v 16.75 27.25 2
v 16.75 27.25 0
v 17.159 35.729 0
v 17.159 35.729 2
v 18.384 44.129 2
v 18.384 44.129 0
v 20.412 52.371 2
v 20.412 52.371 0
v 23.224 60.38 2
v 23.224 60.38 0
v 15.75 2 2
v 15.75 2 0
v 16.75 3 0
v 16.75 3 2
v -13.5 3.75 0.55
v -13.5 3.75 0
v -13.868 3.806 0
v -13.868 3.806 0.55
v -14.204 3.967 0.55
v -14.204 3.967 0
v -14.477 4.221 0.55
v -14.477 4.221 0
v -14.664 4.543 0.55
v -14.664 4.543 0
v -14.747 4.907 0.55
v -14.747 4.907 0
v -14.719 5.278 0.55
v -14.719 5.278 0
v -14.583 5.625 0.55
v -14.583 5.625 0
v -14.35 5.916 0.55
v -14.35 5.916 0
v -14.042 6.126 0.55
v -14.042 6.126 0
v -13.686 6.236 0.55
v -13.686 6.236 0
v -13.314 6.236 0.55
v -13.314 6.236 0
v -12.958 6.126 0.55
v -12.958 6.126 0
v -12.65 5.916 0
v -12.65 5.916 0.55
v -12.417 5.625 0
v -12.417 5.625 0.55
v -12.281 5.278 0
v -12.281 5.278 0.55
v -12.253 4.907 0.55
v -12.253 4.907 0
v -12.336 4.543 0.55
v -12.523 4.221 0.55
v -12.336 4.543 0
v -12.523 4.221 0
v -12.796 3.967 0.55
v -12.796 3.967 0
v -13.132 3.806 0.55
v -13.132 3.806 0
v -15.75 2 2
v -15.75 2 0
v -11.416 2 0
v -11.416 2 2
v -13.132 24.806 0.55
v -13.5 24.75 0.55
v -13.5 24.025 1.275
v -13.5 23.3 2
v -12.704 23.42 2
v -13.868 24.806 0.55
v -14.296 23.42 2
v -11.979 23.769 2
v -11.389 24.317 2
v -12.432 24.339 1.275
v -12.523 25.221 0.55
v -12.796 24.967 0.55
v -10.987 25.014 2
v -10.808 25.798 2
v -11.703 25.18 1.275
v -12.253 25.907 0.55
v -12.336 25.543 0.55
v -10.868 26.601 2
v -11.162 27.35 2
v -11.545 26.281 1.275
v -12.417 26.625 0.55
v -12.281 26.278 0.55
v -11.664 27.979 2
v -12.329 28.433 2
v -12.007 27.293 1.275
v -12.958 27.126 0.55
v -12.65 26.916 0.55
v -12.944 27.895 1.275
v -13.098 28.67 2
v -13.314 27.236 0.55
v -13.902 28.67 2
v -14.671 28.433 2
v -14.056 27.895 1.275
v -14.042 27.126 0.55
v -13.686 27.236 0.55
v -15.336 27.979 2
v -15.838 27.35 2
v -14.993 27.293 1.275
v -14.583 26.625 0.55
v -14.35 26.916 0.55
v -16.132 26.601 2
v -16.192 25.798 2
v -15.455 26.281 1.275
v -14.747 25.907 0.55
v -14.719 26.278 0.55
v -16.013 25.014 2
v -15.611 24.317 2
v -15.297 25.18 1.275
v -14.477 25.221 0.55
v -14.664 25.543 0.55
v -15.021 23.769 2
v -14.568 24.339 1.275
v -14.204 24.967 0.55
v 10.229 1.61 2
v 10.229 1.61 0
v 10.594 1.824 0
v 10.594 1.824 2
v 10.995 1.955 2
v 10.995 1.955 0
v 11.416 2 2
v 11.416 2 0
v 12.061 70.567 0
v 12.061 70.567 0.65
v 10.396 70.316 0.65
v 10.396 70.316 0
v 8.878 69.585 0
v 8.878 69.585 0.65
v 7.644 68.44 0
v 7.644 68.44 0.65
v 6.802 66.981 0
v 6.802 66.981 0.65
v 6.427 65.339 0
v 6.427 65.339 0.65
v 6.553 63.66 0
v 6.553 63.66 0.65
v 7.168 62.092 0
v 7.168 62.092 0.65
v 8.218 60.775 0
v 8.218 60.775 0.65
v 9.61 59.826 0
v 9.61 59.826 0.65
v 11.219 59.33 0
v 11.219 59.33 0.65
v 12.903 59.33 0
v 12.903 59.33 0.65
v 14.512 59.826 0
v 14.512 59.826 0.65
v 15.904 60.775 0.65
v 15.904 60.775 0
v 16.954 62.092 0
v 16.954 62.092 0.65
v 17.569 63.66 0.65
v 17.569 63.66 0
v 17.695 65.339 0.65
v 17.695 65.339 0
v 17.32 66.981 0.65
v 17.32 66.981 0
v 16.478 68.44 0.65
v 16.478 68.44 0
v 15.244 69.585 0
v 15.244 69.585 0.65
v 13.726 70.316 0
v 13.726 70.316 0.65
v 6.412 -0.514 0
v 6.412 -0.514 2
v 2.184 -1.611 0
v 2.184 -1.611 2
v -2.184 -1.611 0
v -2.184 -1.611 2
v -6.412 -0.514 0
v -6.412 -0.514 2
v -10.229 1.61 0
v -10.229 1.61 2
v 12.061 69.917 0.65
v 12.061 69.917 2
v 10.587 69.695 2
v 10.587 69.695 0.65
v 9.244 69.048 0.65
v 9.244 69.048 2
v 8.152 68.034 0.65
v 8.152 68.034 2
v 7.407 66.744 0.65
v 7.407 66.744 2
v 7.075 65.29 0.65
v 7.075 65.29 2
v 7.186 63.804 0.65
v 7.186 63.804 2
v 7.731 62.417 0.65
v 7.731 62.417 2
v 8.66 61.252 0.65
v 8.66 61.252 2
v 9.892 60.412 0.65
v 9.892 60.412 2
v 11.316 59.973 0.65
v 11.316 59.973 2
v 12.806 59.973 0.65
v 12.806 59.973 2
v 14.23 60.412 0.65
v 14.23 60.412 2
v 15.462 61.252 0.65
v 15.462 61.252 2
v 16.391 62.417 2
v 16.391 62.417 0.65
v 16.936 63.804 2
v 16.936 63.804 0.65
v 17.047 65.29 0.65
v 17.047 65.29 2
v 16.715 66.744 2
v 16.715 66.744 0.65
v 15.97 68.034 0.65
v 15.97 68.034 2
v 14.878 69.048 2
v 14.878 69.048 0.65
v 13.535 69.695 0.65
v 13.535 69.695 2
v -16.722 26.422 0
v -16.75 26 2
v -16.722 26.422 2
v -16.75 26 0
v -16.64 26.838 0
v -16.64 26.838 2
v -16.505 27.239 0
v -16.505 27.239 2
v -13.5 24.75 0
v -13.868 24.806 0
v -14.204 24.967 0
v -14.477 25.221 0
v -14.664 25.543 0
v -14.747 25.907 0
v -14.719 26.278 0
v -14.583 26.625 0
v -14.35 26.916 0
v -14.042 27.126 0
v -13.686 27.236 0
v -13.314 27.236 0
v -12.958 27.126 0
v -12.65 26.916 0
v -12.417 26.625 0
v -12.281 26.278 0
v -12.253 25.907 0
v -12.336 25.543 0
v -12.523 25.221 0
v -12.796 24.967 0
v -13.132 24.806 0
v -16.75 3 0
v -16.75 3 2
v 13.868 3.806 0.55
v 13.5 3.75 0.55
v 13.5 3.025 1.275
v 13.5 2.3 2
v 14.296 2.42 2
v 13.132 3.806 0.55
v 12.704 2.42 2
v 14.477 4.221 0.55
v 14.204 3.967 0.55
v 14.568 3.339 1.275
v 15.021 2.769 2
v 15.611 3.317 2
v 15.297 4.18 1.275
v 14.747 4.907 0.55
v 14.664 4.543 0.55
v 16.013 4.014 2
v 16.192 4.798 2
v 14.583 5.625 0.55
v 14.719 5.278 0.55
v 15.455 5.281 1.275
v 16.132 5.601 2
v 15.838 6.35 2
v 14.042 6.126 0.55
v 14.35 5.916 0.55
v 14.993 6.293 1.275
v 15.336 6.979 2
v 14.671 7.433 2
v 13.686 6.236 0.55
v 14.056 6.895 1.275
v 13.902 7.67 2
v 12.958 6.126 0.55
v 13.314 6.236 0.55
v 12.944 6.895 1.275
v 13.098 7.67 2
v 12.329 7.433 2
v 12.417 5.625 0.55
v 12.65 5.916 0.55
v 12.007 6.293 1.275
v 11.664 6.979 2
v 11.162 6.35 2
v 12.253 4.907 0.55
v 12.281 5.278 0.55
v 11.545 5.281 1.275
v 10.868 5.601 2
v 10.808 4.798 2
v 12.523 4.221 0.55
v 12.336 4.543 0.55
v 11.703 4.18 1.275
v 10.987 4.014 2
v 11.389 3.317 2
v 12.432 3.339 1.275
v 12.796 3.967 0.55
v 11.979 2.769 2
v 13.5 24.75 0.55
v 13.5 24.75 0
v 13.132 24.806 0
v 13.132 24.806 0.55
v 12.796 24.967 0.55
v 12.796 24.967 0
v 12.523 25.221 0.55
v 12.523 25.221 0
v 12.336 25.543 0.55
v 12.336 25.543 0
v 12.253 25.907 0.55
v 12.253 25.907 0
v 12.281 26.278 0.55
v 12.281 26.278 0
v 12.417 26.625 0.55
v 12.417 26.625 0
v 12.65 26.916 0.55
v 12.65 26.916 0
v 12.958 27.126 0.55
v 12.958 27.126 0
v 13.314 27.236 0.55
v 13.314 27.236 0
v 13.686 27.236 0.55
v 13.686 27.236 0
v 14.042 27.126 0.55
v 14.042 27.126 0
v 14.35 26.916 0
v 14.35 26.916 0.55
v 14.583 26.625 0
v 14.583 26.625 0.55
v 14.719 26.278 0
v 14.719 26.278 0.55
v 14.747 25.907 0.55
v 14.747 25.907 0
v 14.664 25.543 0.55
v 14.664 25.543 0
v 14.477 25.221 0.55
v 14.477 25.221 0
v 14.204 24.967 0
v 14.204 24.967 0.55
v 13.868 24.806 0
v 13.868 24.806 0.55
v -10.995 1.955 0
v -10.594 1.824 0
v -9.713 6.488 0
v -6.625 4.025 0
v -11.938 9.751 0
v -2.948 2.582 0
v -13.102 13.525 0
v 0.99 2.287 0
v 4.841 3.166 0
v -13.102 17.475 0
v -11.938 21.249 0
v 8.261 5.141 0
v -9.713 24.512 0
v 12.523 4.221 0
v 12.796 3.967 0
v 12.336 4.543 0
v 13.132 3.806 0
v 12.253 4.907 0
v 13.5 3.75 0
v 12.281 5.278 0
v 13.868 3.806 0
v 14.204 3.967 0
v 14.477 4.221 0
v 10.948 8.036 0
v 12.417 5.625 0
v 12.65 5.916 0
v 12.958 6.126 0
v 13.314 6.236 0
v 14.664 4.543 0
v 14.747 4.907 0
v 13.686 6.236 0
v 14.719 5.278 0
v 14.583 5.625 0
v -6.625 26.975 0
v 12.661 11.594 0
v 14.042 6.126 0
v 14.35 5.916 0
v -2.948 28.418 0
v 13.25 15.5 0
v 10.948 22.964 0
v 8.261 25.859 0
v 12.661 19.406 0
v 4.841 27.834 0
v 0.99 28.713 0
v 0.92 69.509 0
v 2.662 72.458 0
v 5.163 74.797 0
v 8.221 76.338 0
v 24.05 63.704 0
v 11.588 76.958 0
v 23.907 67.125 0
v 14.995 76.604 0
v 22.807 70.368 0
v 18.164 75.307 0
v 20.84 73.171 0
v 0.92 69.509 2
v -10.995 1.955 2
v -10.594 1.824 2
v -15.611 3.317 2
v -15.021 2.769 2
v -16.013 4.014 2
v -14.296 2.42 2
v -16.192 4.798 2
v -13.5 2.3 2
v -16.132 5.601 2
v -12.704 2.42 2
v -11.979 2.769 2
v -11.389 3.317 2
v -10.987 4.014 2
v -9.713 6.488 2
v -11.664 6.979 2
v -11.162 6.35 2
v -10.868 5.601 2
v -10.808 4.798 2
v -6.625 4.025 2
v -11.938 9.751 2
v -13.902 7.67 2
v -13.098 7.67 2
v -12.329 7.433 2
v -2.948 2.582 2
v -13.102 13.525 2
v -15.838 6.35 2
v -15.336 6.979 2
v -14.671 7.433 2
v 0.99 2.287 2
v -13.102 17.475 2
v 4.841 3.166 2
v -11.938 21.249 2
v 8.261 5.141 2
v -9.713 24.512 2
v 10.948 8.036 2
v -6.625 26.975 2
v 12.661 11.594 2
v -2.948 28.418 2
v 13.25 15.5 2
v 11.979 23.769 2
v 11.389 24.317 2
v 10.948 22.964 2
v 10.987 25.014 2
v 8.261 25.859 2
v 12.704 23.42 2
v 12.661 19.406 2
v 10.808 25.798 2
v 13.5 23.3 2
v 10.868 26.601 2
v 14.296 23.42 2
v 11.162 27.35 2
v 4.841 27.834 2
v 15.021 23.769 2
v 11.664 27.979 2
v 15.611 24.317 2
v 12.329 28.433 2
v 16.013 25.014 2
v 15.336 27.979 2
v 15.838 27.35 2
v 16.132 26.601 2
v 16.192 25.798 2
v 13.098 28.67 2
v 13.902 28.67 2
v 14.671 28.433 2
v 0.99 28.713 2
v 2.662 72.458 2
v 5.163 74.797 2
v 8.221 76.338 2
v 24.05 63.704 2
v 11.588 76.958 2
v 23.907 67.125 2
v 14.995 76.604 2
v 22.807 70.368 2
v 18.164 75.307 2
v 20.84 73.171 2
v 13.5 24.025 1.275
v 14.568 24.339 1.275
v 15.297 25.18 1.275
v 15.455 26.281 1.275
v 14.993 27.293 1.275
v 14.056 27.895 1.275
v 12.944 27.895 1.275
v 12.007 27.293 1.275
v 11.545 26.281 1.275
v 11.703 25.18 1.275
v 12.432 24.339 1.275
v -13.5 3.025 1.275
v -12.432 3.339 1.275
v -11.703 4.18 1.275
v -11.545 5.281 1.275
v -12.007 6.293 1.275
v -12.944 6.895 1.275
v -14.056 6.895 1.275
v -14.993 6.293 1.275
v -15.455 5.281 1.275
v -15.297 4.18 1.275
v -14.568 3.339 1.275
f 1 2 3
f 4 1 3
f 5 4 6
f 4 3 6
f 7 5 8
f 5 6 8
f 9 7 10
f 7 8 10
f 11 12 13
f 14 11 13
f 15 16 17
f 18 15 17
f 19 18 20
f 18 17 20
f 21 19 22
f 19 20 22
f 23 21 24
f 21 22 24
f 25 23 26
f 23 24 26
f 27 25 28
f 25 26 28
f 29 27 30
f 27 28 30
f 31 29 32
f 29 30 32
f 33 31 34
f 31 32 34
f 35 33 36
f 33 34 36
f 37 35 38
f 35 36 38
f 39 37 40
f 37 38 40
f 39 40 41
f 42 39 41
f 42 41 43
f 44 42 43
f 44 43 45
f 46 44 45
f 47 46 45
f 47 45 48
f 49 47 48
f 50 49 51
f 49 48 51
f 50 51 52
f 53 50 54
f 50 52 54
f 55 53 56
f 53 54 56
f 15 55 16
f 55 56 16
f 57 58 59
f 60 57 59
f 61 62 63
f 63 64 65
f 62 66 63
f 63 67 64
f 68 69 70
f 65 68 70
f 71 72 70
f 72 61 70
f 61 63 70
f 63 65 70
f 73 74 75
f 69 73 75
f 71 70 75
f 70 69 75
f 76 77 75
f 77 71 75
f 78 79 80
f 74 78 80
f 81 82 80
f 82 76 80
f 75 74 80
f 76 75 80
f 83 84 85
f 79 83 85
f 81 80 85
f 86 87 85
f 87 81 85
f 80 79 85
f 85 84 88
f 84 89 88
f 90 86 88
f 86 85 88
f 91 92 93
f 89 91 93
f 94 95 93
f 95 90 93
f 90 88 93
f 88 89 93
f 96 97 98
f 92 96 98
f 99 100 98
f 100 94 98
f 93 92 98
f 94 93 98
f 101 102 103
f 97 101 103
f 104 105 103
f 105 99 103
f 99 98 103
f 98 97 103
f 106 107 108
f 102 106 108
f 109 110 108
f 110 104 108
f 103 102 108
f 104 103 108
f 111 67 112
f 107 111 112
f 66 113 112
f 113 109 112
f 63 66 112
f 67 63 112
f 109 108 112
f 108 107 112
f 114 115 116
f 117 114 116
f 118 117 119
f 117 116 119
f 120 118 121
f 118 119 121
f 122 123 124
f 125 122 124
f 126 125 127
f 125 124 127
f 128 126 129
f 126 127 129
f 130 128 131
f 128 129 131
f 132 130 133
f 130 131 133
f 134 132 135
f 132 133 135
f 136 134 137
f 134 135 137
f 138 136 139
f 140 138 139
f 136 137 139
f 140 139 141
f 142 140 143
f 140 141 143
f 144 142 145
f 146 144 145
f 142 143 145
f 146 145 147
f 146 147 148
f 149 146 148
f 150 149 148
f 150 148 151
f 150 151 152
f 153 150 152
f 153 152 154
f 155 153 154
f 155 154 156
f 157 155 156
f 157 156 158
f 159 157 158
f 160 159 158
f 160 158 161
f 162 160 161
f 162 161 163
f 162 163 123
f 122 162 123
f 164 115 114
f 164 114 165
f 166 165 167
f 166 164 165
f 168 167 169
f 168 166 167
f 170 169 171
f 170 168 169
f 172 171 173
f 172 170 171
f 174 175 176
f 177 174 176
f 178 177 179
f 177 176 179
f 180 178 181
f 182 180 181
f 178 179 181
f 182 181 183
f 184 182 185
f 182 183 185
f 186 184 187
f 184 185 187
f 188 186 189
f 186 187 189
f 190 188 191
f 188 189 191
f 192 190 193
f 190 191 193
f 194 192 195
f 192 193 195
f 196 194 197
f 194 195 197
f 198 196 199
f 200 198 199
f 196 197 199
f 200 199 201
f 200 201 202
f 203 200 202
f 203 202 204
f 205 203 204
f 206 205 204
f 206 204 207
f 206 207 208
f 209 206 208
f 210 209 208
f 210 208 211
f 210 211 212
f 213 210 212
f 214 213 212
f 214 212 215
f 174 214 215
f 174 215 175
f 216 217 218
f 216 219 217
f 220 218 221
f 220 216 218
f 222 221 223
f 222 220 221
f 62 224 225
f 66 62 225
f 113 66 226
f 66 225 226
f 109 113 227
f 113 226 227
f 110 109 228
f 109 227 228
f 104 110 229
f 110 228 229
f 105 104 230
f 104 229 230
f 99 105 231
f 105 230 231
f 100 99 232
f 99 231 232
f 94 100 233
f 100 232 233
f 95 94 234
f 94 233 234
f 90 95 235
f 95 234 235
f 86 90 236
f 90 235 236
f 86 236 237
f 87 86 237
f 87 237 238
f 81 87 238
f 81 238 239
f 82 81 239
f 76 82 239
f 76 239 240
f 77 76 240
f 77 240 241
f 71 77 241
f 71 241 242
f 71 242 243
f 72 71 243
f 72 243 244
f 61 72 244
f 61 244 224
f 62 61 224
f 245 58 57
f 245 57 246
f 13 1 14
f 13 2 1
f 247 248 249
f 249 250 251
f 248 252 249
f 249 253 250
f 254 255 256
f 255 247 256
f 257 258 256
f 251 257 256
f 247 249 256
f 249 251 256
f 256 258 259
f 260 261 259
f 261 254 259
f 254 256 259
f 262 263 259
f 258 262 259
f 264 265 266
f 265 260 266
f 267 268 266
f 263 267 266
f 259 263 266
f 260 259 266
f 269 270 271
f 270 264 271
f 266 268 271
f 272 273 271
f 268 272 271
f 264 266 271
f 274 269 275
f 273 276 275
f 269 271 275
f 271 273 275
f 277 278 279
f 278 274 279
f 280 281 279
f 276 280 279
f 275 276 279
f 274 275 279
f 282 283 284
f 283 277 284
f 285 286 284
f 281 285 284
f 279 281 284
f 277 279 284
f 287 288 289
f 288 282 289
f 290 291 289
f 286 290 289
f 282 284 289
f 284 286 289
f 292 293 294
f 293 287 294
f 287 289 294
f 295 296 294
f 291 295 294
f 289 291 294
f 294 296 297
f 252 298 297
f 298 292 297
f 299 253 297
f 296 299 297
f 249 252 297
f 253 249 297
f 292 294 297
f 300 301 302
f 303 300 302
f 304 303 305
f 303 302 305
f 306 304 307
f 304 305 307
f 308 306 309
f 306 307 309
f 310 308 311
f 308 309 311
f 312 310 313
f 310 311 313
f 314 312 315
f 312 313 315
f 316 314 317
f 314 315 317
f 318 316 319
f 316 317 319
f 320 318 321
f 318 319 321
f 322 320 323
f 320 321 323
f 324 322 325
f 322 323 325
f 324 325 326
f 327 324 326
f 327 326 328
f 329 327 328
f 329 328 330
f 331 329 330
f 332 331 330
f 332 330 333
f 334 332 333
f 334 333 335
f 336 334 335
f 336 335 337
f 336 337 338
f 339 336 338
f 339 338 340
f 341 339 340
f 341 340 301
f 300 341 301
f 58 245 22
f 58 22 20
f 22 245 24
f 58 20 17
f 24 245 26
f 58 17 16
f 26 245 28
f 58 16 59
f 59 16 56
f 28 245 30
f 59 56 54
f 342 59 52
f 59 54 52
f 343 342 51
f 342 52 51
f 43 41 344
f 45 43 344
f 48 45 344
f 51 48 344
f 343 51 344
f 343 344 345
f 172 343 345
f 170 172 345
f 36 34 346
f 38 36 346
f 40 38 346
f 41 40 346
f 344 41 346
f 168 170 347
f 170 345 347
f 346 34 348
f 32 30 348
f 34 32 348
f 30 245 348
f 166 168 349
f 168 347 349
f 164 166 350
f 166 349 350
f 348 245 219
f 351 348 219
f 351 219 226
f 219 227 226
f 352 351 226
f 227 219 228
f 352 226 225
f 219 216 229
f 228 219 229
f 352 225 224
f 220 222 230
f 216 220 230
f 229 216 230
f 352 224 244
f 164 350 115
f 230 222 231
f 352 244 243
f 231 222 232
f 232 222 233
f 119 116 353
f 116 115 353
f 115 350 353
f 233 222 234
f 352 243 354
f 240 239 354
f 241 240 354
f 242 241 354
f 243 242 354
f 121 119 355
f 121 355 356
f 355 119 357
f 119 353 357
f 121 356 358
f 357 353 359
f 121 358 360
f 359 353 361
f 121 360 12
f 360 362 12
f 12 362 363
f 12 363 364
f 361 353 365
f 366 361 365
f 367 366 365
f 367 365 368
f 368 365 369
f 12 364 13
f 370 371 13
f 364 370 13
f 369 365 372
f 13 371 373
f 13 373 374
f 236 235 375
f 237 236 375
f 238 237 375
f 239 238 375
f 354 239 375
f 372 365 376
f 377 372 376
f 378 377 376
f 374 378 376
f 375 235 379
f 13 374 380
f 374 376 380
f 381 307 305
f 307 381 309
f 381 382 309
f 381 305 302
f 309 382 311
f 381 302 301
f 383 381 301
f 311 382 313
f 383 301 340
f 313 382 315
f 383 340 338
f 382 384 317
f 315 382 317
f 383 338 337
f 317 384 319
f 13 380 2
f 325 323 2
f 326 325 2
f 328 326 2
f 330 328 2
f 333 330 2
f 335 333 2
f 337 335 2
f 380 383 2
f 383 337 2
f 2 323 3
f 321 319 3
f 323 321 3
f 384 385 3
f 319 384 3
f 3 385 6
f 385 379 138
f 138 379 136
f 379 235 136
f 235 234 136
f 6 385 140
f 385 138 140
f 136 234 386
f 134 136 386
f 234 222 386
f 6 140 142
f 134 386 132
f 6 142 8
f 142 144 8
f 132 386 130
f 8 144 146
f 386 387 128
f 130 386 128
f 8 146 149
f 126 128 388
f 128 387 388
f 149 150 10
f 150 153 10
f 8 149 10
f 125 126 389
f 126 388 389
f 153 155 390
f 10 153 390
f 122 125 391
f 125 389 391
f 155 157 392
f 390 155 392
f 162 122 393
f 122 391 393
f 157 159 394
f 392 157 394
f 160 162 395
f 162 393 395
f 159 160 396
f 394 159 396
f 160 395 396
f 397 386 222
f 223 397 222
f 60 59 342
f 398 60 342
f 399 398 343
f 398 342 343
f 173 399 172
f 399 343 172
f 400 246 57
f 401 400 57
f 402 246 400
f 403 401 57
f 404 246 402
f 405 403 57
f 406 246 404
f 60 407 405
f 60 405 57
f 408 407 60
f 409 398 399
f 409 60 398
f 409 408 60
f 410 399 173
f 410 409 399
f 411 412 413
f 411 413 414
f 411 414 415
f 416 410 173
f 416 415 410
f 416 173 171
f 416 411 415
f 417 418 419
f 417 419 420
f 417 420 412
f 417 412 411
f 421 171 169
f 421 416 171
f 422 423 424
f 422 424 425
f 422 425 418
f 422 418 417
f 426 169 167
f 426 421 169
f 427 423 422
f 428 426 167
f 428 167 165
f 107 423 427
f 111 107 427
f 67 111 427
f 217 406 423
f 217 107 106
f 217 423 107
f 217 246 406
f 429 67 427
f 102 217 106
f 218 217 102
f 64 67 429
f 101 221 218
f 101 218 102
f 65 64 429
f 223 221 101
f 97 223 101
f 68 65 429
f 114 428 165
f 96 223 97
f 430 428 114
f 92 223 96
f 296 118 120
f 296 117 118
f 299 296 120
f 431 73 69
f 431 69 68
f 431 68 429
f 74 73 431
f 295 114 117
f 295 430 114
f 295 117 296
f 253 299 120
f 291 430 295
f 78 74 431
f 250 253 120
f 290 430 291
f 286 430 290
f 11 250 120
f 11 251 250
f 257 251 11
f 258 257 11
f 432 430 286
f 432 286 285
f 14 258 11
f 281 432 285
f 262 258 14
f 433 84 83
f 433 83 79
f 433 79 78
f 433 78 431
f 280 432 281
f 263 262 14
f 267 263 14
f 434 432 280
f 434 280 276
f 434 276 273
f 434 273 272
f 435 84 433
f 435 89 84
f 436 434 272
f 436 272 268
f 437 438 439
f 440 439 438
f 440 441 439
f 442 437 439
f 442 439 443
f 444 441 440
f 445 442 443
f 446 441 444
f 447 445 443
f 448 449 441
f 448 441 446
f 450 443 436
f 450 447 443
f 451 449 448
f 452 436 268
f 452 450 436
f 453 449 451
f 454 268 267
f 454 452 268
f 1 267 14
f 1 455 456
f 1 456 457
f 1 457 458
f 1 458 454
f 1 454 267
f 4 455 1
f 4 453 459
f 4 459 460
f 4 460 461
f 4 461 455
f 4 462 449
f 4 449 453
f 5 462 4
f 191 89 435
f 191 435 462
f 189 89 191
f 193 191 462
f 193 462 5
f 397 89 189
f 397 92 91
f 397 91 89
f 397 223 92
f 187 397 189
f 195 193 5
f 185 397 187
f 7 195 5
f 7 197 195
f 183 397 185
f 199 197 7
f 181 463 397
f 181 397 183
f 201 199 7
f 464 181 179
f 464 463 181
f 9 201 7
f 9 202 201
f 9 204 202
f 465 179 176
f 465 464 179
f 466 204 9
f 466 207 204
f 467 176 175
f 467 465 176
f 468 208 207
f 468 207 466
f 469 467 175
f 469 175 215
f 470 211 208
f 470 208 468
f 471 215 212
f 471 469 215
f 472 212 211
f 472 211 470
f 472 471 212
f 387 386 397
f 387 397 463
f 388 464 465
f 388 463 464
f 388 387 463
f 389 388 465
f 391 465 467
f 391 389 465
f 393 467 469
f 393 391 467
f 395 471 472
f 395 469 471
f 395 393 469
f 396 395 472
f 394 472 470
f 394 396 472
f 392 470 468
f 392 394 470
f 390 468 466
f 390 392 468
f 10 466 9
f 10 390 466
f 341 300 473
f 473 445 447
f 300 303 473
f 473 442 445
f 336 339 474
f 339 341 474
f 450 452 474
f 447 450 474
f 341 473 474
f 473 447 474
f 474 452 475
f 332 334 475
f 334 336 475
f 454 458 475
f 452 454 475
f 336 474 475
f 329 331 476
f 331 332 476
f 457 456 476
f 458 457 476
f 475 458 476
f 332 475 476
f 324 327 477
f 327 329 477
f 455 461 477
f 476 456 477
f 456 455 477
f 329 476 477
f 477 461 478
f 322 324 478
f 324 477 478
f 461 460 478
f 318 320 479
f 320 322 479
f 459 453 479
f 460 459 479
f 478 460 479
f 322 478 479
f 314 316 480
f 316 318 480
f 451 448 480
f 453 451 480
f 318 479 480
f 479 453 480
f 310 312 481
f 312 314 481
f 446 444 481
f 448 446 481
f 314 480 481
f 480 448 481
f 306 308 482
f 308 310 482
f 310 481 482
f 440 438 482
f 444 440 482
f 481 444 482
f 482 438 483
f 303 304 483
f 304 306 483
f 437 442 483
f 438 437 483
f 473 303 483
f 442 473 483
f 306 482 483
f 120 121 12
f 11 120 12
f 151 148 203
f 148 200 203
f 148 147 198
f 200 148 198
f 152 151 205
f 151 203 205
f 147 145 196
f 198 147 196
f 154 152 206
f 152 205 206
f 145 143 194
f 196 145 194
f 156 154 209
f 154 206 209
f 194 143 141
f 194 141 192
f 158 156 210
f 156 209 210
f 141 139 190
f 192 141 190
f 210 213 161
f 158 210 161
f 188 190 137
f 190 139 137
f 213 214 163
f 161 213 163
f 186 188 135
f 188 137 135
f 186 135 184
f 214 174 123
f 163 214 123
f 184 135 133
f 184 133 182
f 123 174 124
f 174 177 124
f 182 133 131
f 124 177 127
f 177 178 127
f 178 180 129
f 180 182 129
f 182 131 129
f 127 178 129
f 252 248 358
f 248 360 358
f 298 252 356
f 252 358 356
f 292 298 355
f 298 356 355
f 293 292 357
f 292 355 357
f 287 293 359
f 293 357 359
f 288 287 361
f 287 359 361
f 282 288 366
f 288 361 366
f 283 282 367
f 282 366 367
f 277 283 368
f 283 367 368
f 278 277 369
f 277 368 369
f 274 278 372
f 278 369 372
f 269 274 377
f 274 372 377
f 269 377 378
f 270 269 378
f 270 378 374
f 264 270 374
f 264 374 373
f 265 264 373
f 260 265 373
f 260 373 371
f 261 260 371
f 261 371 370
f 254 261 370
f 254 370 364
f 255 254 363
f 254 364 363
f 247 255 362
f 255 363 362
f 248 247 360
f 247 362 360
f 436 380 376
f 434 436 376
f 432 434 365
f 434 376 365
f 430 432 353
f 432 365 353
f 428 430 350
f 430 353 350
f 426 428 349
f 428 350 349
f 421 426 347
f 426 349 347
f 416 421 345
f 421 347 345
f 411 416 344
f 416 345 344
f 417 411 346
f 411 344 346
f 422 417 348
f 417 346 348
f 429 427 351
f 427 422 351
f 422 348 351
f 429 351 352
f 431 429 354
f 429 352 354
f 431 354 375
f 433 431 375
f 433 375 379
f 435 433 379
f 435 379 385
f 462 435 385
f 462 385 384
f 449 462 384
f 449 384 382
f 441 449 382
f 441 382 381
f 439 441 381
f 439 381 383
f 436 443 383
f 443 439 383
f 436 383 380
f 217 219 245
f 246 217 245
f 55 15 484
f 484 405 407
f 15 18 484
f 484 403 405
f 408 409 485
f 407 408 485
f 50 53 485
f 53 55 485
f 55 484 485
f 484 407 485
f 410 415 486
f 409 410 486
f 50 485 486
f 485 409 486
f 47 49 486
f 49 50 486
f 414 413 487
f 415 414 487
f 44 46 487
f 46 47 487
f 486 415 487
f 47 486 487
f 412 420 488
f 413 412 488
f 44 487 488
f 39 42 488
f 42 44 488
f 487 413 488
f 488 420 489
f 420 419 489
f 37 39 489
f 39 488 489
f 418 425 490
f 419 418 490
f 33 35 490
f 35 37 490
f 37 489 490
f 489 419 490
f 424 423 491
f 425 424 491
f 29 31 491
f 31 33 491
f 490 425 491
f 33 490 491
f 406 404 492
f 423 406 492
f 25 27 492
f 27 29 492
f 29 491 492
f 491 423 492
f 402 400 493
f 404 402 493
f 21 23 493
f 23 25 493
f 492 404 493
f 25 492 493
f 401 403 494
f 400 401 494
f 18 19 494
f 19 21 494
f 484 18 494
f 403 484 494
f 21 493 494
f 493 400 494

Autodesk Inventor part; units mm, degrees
ref_plane "YZ Plane" through (0, 0, 0) normal (1, 0, 0) x (0, 1, 0)
ref_plane "XZ Plane" through (0, 0, 0) normal (0, 1, 0) x (-1, 0, 0)
ref_plane "XY Plane" through (0, 0, 0) normal (0, 0, 1) x (1, 0, 0)
sketch "スケッチ1" plane through (0, 0, 0) normal (0, 0, 1) x (1, 0, 0)
  circle A0 centre (0, 15.5) radius 1.5 construction
  circle A1 centre (-13.5, 26) radius 1.25 construction
  circle A2 centre (13.5, 26) radius 1.25 construction
  circle A3 centre (-13.5, 5) radius 1.25 construction
  circle A4 centre (13.5, 5) radius 1.25 construction
  arc A5 (23.2244, 60.3803) -> (0.9204, 69.5092) centre (12.061, 64.9168) ccw
  line L0 (0.9204, 69.5092) -> (-16.5047, 27.2386)
  arc A6 (23.2244, 60.3803) -> (16.75, 27.25) centre (104.7526, 27.25) ccw
  arc A7 (-16.5047, 27.2386) -> (-16.75, 26) centre (-13.5, 26) ccw
  circle A8 centre (0, 15.5) radius 13.25
  line L1 (-16.75, 26) -> (-16.75, 3)
  line L2 (-15.75, 2) -> (-11.4155, 2)
  line L3 (11.4155, 2) -> (15.75, 2)
  arc A9 (-10.2294, 1.6104) -> (10.2294, 1.6104) centre (0, 15.5) ccw
  line L4 (16.75, 27.25) -> (16.75, 3)
  line L5 (15.75, 2) -> (16.75, 3)
  line L6 (-15.75, 2) -> (-16.75, 3)
  arc A10 (-10.2294, 1.6104) -> (-11.4155, 2) centre (-11.4155, 0) ccw
  arc A11 (11.4155, 2) -> (10.2294, 1.6104) centre (11.4155, 0) ccw
  circle A12 centre (12.061, 64.9168) radius 5 construction
  line L7 (0, 15.5) -> (0, 44.2694) construction
  point P0 (0, 0)
  point P1 (-10.7384, 2)
  point P2 (10.7384, 2)
  point P3 (16.75, 2)
  point P4 (-16.75, 2)
  dimension "d0" = 26.5
  dimension "d1" = 4
  dimension "d2" = 3
  dimension "d3" = 1
  dimension "d4" = 1
  dimension "d5" = 1
  dimension "d6" = 1
  dimension "d7" = 2
  dimension "d27" = 12.05
extrude "押し出し1" add sketch "スケッチ1" along normal blind 2
hole "穴1" at (12.061, 64.9168, 0) direction (0, 0, 1) diameter 10 end through all counterbore diameter 11.3 counterbore depth 0.65
sketch "スケッチ2" plane through (0, 0, 2) normal (0, 0, 1) x (1, 0, 0)
  circle A0 centre (13.5, 5) radius 1.25 construction
  circle A1 centre (-13.5, 5) radius 1.25 construction
  circle A2 centre (-13.5, 26) radius 1.25 construction
  circle A3 centre (13.5, 26) radius 1.25 construction
  point P0 (0, 0)
hole "穴2" at (-13.5, 5, 2) at (-13.5, 26, 2) at (13.5, 26, 2) at (13.5, 5, 2) direction (0, 0, -1) diameter 2.5 end through all countersink diameter 5.4 countersink angle 90
equation "\"d4\" = d3"
equation "\"d5\" = d3"
equation "\"d6\" = d5"
properties part number "UPPER_LEG_MIDDLE_FRAME_3"
